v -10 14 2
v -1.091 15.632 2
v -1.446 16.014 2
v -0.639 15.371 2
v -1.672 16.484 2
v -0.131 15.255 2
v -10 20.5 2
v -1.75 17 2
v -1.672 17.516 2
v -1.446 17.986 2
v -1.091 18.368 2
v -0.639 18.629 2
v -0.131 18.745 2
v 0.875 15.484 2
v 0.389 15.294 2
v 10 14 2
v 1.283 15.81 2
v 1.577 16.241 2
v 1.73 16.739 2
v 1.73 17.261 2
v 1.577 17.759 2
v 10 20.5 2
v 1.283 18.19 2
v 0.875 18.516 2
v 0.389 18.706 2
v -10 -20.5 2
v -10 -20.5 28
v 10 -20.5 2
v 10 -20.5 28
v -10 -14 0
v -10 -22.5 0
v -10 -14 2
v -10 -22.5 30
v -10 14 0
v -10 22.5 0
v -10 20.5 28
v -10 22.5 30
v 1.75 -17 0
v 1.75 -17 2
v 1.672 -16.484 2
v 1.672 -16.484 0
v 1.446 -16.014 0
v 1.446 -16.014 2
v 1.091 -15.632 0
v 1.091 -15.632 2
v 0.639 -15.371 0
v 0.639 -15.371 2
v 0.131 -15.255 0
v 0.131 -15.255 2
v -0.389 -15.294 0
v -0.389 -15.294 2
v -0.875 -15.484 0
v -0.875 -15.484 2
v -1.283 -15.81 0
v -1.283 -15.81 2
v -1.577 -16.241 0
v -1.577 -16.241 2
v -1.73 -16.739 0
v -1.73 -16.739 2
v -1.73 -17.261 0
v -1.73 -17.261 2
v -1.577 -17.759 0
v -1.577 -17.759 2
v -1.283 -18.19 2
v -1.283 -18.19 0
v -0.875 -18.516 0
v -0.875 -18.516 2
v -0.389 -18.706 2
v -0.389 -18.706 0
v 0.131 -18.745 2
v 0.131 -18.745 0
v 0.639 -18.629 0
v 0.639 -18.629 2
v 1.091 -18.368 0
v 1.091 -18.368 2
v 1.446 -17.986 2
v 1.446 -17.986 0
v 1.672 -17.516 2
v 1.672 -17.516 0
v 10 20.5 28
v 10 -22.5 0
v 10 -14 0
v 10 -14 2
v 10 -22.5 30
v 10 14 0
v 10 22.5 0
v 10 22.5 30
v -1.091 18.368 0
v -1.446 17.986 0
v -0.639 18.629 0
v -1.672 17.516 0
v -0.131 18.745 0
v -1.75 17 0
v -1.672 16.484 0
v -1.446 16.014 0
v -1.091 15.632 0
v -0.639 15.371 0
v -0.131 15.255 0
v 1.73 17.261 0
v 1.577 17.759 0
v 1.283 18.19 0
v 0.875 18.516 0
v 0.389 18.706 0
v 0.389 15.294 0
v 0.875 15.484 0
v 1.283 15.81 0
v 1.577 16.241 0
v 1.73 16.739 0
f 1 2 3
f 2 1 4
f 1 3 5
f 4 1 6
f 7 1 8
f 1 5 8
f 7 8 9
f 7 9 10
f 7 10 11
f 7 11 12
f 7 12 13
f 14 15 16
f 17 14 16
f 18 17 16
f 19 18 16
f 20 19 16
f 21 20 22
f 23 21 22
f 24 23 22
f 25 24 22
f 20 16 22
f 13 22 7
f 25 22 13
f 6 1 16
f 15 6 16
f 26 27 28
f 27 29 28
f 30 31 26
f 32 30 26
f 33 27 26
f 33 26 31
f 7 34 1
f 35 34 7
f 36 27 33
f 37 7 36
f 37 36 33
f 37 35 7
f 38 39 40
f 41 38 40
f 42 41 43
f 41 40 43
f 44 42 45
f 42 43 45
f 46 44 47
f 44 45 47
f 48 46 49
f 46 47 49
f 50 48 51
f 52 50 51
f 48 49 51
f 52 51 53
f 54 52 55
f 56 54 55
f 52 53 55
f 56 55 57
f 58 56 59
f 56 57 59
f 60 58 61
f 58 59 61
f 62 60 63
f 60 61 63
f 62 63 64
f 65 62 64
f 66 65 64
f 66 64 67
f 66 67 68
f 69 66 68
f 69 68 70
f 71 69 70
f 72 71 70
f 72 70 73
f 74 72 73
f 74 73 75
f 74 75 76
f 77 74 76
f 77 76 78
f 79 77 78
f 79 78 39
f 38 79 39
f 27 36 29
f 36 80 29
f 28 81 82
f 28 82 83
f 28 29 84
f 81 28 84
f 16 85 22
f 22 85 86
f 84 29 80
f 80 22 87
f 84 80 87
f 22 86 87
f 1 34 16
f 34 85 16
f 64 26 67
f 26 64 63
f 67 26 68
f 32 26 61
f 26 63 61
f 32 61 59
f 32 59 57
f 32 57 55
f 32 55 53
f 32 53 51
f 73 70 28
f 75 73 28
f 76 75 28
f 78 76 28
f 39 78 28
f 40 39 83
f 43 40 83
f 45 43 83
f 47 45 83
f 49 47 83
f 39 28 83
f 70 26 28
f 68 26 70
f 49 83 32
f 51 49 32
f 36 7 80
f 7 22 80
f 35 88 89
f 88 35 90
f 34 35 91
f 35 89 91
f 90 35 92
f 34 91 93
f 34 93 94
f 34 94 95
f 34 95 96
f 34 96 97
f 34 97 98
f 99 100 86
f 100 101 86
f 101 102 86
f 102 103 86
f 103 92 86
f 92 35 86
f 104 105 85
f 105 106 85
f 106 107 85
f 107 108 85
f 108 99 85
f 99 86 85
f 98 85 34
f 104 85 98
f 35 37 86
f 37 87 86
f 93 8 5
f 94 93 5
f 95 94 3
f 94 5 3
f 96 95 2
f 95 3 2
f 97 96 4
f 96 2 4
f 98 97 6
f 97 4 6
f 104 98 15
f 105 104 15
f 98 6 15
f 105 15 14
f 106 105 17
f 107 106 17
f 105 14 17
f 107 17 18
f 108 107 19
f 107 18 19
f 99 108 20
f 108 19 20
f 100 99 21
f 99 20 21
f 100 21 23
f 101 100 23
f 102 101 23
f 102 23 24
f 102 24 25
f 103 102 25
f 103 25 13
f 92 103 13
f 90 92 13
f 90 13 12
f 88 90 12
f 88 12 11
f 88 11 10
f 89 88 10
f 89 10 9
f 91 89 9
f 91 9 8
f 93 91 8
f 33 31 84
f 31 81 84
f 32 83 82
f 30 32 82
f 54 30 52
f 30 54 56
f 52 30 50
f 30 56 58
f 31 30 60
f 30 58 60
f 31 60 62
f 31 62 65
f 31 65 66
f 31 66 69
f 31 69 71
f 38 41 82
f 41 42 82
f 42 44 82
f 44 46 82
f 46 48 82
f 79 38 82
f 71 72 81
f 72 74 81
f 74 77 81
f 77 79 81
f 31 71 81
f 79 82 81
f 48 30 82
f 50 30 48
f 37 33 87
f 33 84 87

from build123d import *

# Parameters (mm, degrees)
BOSS_EXTRUDE1_DEPTH = 10
SKETCH5_R           = 1.75
CUT_EXTRUDE2_DEPTH  = 38.286056375


with BuildPart() as part:
    # Sketch3 → Boss-Extrude1 (new, symmetric)
    with BuildSketch(Plane(origin=(0, 0, 0), x_dir=(0, 0, -1), z_dir=(1, 0, 0))):
        Polygon((0, -14), (0, -22.5), (-30, -22.5), (-30, 22.5), (0, 22.5), (0, 14), (-2, 14), (-2, 20.5), (-28, 20.5), (-28, -20.5), (-2, -20.5), (-2, -14), align=None)
    extrude(amount=BOSS_EXTRUDE1_DEPTH, both=True)

    # Sketch5 → Cut-Extrude2 (cut, through all)
    with BuildSketch(Plane.XY.offset(2)):
        with Locations((0, -17)):
            Circle(SKETCH5_R)
        with Locations(Location((0, 17, 0), (0, 0, 180))):
            Circle(SKETCH5_R)
    extrude(amount=-CUT_EXTRUDE2_DEPTH, mode=Mode.SUBTRACT)


solid = part.part
